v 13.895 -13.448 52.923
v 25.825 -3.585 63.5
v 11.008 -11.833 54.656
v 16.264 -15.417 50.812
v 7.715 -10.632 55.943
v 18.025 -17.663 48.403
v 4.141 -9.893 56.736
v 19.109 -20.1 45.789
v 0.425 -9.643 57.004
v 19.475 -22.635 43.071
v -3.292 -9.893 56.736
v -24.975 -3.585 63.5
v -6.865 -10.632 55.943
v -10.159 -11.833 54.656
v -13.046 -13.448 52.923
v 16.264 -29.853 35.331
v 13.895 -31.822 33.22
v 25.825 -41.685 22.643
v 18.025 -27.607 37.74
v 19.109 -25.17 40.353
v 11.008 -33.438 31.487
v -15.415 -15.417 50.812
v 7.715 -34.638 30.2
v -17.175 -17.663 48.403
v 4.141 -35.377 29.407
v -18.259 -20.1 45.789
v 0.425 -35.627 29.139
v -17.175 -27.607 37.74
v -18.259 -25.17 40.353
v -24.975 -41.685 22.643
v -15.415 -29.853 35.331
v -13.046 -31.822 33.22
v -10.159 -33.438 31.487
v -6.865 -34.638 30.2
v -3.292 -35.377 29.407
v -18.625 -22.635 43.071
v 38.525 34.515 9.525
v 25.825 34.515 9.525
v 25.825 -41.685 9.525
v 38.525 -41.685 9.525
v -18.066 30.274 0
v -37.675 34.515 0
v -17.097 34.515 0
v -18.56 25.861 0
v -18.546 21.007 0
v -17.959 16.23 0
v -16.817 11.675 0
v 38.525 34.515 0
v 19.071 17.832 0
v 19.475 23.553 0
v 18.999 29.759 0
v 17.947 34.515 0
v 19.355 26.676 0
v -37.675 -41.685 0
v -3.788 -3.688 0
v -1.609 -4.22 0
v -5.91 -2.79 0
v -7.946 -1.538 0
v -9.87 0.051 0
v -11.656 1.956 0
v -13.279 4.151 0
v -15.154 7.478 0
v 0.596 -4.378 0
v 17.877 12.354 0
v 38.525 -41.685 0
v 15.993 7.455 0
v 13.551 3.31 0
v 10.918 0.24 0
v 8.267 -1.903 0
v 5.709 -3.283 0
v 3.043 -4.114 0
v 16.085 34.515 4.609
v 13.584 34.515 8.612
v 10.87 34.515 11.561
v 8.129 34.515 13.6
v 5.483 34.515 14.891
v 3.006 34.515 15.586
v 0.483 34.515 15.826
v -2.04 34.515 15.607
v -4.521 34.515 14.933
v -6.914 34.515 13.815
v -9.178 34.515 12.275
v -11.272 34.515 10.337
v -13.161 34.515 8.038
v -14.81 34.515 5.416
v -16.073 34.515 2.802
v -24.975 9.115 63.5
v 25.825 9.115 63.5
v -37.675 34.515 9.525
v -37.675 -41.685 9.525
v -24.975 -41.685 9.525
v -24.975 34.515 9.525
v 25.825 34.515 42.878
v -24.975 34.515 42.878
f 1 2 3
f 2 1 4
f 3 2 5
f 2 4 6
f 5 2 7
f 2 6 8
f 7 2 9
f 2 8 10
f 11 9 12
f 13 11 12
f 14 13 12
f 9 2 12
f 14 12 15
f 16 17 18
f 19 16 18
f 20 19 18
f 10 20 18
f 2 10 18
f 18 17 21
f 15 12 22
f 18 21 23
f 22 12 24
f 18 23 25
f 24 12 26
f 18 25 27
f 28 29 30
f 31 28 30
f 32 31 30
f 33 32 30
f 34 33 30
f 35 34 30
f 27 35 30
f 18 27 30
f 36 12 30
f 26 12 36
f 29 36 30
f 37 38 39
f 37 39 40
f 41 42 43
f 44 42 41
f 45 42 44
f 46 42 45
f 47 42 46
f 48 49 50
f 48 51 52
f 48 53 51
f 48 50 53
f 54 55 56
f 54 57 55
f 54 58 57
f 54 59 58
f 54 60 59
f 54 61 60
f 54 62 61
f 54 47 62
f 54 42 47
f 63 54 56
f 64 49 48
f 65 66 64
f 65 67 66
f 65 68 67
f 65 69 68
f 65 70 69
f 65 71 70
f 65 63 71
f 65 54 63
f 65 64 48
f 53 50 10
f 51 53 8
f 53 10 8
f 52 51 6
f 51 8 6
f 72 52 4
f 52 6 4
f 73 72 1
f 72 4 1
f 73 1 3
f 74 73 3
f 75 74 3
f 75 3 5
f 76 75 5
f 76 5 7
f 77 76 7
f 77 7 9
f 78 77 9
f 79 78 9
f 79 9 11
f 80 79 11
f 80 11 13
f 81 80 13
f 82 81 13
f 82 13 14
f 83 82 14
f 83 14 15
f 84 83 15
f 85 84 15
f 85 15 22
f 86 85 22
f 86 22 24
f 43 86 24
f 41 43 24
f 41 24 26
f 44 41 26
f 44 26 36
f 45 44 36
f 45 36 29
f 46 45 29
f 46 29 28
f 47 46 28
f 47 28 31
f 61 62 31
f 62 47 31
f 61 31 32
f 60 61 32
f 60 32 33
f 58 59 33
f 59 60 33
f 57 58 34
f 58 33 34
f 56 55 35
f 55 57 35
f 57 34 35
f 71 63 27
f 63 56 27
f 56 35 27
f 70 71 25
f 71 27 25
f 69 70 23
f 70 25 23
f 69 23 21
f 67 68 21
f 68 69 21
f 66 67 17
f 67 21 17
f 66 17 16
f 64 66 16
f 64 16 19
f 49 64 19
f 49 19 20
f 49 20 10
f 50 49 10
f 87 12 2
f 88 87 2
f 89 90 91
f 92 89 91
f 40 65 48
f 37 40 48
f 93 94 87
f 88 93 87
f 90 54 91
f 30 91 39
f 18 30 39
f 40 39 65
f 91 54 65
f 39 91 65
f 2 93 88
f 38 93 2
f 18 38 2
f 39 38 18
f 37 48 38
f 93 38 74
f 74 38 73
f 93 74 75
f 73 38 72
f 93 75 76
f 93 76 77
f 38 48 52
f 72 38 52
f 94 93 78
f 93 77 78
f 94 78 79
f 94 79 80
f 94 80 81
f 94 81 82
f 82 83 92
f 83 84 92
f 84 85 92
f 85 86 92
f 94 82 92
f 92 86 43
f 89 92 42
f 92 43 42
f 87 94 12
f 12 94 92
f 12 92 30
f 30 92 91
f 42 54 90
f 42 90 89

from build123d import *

# Parameters (mm, degrees)
F0_W     = 12.773345685
F0_H     = 76.2
F0_W_2   = 12.626654315
F0_W_3   = 50.8
F1_DEPTH = 9.525
F2_W     = 50.8
F2_H     = 76.2
F3_DEPTH = 63.5
F5_DEPTH = 107.696
F6_R     = 19.05
F7_DEPTH = 89.662


with BuildPart() as f1:
    # F0 (on Top) → F1 (new body)
    with BuildSketch(Plane.XY):
        with Locations((-31.2884969145, -3.5850352719)):
            Rectangle(F0_W, F0_H)
        with Locations((32.2115030855, -3.5850352719)):
            Rectangle(F0_W_2, F0_H)
        with Locations((0.498175928, -3.5850352719)):
            Rectangle(F0_W_3, F0_H)
    extrude(amount=F1_DEPTH)

    # F2 (on face) → F3 (join)
    with BuildSketch(Plane(origin=(0, 0, 0), x_dir=(1, 0, 0), z_dir=(0, 0, -1))):
        with Locations((0.424830243, 3.5850352719)):
            Rectangle(F2_W, F2_H)
    extrude(amount=-F3_DEPTH)

    # F4 (on face) → F5 (cut)
    with BuildSketch(Plane(origin=(-24.975169757, 0, 0), x_dir=(0, -1, 0), z_dir=(-1, 0, 0))):
        Polygon((-34.5149647281, 63.5), (-34.5149647281, 42.8782887757), (-9.1149647281, 63.5), align=None)
        Polygon((41.6850352719, 63.5), (3.5850352719, 63.5), (41.6850352719, 22.6427521481), align=None)
    extrude(amount=-F5_DEPTH, mode=Mode.SUBTRACT)

    # F6 (on face) → F7 (cut)
    with BuildSketch(Plane(origin=(0, -33.5902159411, 31.3233831117), x_dir=(1, 0, 0), z_dir=(0, -0.7313537016, 0.6819983601))):
        with Locations((0.424830243, 16.0633533902)):
            Circle(F6_R)
    extrude(amount=-F7_DEPTH, mode=Mode.SUBTRACT)


solid = f1.part
